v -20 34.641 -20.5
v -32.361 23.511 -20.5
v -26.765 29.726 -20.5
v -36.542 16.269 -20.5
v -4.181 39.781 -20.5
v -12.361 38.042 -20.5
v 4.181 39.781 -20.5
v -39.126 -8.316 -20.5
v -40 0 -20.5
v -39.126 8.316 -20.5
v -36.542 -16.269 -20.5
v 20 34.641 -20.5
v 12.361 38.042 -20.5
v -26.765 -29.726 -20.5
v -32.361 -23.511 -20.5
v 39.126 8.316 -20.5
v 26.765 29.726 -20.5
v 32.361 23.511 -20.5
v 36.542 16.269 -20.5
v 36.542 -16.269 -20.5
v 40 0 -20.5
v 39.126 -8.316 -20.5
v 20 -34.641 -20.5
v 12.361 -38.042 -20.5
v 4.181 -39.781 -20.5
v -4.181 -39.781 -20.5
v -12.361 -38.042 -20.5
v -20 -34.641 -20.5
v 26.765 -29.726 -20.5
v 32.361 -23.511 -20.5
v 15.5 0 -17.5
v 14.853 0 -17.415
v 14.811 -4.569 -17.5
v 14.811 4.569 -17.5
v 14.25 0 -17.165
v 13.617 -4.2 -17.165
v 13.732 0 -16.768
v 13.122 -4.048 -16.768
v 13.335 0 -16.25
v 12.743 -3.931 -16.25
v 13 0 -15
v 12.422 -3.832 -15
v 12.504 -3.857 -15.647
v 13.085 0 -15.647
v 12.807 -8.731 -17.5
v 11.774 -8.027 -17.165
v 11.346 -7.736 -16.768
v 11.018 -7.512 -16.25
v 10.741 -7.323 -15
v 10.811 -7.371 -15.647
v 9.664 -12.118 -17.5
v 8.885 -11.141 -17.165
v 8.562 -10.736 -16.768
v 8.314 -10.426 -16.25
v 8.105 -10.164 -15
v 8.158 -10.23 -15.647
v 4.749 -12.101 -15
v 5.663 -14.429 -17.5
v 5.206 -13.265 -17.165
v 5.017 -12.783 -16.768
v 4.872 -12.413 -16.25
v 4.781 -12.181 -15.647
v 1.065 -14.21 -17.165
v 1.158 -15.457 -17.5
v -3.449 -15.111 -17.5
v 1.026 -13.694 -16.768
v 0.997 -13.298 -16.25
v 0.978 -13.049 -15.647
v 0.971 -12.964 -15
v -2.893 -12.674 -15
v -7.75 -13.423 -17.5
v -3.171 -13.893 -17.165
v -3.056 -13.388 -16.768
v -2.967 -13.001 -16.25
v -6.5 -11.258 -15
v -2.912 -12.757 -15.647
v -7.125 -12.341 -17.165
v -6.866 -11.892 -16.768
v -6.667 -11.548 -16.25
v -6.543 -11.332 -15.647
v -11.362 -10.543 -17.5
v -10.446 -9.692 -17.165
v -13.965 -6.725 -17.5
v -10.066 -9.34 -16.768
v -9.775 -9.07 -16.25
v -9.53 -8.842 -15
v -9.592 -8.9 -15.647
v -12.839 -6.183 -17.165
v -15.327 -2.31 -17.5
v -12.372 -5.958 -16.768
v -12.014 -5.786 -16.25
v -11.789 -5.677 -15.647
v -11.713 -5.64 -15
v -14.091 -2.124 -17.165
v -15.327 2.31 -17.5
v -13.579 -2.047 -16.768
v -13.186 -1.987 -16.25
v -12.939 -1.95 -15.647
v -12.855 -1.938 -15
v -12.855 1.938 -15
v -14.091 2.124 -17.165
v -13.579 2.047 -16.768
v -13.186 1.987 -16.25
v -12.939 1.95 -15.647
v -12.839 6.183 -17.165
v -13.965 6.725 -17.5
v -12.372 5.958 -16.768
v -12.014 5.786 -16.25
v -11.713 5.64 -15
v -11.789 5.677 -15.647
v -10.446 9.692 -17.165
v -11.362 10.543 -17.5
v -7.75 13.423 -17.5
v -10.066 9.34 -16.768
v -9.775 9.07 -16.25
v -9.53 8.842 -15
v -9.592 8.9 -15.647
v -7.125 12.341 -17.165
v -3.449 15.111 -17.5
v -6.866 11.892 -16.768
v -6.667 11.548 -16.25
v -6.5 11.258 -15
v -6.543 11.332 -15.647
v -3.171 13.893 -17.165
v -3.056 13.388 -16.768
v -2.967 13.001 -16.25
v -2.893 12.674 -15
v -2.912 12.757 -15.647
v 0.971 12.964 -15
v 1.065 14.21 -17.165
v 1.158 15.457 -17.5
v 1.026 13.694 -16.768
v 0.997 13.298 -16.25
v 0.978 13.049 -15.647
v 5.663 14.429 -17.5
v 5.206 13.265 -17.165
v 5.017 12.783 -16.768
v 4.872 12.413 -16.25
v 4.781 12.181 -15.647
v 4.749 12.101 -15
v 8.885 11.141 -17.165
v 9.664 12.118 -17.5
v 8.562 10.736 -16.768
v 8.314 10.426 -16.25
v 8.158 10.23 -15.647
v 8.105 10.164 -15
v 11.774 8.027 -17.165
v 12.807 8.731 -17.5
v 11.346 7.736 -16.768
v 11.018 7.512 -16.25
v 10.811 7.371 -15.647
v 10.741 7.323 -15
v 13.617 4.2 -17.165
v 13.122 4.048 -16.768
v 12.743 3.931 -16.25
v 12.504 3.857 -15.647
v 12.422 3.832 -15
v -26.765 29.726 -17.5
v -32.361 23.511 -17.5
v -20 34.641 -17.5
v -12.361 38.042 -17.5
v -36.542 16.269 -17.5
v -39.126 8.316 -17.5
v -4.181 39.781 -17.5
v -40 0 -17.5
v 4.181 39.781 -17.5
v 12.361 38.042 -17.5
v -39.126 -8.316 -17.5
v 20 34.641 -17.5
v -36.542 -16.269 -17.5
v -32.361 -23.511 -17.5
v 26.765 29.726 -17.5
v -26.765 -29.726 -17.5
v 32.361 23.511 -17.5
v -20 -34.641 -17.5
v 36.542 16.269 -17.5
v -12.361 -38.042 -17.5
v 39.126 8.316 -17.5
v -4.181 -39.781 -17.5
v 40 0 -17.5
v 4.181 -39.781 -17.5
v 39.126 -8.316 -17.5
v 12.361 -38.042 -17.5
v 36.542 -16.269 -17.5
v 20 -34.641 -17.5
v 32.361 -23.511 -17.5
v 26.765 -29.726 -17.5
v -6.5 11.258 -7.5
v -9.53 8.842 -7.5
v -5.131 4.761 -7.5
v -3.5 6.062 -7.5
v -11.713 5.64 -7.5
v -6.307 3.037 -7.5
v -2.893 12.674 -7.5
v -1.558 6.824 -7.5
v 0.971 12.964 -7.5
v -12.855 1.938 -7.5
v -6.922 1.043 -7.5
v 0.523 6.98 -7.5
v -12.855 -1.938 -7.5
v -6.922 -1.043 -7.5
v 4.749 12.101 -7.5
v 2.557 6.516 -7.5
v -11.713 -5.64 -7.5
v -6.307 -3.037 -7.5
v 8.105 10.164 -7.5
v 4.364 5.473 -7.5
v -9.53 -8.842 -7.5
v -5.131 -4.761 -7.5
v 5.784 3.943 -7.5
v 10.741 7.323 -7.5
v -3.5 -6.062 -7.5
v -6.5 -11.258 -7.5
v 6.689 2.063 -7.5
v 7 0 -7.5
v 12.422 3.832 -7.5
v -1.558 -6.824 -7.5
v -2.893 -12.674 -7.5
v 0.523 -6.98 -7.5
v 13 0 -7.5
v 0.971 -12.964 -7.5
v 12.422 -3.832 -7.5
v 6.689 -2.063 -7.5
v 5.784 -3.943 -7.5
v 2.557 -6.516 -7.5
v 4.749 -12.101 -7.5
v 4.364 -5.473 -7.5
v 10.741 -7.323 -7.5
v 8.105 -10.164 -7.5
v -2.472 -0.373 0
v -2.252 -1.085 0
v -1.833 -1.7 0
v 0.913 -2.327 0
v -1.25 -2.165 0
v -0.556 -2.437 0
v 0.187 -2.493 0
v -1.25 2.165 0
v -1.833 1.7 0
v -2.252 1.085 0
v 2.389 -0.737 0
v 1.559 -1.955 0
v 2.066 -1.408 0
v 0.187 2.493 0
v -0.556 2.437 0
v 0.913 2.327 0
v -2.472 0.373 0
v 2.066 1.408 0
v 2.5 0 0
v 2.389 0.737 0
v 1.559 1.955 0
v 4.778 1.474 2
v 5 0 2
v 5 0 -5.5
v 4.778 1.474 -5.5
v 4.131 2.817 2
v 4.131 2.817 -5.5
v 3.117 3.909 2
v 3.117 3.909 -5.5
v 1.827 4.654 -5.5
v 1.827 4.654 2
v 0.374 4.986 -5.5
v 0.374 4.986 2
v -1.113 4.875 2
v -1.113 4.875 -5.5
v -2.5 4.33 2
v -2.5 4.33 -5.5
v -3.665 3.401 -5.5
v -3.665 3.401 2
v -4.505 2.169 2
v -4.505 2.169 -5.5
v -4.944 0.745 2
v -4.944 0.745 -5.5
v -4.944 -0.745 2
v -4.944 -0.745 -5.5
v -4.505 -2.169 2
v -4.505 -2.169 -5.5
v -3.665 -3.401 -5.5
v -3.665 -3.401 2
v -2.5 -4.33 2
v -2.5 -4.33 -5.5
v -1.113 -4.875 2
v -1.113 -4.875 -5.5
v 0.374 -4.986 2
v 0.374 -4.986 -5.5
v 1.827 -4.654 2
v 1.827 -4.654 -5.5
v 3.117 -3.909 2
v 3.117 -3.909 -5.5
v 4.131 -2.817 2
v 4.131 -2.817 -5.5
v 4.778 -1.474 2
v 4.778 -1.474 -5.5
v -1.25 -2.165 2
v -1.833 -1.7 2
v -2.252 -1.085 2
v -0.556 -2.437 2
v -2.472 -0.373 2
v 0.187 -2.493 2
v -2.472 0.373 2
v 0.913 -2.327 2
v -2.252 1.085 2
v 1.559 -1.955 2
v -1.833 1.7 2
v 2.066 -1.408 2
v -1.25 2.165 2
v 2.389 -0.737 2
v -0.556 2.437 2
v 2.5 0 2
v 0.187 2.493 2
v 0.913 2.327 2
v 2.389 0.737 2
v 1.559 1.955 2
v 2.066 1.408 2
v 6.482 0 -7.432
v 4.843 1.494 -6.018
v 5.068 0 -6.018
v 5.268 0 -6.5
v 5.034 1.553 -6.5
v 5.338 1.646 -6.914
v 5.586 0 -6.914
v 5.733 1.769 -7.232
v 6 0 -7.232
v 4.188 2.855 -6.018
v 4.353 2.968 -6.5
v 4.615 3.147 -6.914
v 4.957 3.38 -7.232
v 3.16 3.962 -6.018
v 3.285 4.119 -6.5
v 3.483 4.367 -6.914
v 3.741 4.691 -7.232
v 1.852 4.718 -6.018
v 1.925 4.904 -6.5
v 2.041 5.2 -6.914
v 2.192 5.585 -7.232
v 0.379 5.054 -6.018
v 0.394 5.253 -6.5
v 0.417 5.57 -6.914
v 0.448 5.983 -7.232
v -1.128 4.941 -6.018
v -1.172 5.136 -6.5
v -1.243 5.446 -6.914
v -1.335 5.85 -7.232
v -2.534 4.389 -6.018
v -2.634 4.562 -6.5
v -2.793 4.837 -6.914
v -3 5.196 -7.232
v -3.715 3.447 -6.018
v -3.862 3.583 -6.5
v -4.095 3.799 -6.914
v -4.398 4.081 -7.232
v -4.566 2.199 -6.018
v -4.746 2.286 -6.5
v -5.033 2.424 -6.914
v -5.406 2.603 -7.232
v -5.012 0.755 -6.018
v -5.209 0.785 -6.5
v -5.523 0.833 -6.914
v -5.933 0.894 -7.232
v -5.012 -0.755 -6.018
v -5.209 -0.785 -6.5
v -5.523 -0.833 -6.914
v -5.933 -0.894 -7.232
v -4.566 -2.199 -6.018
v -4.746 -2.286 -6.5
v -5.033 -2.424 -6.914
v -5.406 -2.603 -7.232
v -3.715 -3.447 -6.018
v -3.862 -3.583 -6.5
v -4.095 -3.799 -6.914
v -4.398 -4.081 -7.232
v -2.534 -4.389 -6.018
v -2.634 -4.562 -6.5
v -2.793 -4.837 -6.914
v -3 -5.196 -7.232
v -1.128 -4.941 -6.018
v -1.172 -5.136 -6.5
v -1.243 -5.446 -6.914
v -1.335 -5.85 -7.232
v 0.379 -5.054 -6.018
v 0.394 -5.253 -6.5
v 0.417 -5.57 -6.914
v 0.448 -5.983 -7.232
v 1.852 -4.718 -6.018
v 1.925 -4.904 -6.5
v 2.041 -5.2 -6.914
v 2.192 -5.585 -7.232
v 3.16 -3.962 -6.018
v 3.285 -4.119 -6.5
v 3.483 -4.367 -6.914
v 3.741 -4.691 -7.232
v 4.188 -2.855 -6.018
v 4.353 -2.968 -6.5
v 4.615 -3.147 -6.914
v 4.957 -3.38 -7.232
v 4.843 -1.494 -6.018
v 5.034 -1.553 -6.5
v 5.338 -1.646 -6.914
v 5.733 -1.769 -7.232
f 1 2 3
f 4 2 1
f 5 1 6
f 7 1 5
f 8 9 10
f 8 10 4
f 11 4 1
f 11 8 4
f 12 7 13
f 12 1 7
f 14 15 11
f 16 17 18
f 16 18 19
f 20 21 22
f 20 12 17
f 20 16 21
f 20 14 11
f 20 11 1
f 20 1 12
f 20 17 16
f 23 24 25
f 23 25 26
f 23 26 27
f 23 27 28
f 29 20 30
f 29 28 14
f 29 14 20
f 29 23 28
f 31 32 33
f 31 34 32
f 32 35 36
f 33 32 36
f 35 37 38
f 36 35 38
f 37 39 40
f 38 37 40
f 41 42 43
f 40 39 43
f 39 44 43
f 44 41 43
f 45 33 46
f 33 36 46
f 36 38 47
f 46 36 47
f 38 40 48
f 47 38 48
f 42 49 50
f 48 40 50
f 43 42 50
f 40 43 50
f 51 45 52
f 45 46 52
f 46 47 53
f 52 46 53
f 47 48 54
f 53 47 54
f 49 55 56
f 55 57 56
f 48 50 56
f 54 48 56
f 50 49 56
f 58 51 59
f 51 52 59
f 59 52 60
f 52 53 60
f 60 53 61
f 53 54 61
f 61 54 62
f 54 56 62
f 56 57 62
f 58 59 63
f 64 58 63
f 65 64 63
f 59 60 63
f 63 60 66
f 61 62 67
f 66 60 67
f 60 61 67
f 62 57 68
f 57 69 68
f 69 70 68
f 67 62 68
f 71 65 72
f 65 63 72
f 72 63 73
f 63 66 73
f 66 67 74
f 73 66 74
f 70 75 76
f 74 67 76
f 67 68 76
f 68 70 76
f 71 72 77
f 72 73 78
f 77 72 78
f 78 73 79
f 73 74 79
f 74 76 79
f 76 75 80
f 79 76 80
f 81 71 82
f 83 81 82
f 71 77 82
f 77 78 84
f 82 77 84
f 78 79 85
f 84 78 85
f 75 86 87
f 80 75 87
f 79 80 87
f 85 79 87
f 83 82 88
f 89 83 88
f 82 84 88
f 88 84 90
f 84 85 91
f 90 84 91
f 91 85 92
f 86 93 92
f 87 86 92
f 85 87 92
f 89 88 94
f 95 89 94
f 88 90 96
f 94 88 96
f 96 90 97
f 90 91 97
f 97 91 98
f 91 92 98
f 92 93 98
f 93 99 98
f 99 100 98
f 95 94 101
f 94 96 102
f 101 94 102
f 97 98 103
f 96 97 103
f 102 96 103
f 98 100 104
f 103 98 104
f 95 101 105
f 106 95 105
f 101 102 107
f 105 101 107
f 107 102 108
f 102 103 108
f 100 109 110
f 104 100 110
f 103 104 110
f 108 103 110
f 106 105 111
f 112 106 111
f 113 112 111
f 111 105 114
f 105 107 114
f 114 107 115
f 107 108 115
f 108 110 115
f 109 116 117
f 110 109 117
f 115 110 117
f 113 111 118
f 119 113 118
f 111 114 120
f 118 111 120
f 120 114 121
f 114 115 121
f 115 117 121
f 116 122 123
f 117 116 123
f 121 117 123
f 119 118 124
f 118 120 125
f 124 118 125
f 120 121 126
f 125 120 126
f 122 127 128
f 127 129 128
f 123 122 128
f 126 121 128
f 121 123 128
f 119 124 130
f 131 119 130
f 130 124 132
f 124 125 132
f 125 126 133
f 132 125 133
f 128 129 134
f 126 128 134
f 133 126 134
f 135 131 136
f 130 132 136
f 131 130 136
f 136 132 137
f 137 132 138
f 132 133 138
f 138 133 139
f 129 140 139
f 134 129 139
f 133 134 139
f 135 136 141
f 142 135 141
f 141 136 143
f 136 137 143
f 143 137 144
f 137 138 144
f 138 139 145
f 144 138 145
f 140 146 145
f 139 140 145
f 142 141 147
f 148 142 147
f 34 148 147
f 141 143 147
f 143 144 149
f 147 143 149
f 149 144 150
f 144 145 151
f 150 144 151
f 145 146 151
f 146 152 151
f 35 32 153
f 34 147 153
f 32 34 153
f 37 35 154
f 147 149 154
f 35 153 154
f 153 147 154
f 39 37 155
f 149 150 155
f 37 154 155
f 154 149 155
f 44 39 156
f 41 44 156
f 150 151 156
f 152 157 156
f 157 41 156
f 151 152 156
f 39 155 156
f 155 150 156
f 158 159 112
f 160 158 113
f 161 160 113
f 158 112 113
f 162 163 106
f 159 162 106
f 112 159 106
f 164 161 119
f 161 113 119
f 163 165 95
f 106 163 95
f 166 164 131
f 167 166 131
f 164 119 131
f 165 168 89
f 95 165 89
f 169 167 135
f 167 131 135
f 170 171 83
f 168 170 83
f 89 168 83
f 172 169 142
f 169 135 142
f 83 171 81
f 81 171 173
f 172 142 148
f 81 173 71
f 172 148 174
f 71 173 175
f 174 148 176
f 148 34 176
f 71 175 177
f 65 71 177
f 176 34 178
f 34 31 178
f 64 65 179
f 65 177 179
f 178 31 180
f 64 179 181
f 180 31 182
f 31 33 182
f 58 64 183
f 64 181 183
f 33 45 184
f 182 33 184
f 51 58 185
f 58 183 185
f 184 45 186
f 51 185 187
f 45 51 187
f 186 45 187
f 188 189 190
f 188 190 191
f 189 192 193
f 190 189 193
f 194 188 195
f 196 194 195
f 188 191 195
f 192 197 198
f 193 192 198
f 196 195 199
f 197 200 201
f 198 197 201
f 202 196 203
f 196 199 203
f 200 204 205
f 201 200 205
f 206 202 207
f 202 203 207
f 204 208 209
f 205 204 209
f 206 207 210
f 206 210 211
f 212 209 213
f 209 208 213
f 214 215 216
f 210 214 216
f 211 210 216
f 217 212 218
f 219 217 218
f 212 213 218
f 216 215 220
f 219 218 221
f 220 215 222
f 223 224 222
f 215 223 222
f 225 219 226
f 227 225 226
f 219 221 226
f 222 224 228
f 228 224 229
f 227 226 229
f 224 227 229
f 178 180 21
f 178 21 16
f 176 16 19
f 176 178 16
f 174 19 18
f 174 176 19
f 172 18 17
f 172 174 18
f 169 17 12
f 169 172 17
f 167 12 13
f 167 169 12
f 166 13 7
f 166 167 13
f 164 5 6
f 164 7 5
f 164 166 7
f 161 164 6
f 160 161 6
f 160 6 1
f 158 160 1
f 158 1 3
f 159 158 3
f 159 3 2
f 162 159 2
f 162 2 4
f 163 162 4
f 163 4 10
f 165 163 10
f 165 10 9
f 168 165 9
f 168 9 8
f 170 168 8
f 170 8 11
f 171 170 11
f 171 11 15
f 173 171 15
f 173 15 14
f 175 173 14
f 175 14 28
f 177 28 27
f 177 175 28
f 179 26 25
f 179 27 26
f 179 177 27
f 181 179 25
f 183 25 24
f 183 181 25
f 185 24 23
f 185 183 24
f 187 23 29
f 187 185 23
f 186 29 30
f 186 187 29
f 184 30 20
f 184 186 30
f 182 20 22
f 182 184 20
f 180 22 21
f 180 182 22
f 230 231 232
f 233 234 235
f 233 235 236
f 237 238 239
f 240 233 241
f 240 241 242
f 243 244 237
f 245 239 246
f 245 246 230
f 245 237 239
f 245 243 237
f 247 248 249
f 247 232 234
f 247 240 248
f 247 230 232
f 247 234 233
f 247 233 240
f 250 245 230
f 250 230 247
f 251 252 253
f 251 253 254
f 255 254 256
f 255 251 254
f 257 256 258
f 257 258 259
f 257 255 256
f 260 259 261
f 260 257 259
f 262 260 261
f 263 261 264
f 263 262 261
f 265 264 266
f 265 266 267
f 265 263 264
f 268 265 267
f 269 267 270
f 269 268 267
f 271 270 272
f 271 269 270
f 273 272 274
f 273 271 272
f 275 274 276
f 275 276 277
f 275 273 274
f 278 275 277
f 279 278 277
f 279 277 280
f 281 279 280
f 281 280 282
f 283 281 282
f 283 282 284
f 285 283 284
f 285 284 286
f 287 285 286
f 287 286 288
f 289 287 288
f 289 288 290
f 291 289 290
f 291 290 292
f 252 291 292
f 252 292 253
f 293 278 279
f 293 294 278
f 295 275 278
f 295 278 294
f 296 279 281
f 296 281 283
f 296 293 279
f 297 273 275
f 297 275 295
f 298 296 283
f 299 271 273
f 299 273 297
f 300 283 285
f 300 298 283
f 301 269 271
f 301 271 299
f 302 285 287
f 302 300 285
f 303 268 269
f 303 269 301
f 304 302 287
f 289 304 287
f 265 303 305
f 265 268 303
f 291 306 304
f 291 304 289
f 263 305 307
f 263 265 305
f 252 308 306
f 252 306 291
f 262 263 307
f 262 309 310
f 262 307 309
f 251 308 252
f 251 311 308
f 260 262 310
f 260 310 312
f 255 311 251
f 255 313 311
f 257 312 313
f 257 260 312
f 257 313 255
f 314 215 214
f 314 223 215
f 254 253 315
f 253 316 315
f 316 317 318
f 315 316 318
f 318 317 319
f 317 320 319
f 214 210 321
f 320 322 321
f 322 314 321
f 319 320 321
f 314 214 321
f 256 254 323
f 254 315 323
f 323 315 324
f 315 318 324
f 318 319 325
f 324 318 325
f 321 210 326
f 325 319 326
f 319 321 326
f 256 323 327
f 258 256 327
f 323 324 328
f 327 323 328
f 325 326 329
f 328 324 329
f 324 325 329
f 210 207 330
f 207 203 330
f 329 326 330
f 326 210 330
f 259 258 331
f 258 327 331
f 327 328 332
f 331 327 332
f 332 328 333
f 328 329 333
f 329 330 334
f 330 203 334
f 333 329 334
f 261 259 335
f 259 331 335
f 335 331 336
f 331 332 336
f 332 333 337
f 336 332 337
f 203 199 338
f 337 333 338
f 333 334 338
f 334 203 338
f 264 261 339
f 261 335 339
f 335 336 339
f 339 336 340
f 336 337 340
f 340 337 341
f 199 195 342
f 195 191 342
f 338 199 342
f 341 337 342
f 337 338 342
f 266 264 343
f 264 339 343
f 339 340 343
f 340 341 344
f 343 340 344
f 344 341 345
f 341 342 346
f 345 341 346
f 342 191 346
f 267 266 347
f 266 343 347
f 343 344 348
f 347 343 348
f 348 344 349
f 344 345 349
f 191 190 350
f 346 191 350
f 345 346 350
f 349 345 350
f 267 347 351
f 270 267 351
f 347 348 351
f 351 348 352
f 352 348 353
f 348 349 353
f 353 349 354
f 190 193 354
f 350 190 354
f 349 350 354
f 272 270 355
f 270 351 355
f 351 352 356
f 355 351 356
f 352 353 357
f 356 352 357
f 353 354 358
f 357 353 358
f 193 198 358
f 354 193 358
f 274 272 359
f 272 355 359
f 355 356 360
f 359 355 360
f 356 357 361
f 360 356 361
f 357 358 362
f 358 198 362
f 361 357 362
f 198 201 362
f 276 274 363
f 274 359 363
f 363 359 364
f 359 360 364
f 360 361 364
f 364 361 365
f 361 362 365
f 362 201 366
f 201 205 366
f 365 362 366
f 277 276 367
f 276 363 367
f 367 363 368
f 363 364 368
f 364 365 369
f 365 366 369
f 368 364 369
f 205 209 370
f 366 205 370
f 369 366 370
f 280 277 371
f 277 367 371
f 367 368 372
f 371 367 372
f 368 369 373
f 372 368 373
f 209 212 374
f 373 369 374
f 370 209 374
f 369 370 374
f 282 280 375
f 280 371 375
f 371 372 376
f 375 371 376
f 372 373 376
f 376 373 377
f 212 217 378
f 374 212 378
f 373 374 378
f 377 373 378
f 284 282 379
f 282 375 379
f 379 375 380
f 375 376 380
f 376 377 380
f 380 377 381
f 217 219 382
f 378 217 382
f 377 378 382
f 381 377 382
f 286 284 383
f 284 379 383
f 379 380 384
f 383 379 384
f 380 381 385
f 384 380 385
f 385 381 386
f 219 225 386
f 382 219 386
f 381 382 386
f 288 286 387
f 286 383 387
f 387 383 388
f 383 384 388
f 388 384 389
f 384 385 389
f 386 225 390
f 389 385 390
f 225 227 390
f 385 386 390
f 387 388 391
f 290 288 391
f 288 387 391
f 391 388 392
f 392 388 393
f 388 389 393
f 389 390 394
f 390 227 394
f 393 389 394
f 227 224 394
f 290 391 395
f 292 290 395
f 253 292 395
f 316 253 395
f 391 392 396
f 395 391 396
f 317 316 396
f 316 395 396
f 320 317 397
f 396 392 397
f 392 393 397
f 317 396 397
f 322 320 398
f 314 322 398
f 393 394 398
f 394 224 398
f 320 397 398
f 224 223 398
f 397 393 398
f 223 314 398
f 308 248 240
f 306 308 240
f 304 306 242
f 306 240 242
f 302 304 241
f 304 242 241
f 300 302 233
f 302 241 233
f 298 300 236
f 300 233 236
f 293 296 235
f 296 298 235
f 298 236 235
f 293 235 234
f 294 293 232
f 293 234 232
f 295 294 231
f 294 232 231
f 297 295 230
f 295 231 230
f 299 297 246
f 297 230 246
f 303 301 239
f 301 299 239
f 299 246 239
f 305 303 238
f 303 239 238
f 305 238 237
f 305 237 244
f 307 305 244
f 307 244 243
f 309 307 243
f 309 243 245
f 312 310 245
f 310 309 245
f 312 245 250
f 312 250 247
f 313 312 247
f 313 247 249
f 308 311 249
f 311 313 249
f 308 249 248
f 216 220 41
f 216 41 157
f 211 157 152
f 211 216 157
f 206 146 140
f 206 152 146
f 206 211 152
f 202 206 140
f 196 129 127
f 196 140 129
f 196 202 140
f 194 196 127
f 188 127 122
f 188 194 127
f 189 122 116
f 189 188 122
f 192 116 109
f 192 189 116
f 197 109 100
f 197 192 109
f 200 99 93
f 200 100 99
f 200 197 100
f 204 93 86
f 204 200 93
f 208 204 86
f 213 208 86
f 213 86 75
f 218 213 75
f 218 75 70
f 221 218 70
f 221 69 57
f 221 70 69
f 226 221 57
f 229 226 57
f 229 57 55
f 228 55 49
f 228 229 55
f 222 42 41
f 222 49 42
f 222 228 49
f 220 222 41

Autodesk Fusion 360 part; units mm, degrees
sketch "Sketch1" plane through (0, 0, 0) normal (0, 0, 1) x (1, 0, 0)
  circle A0 centre (0, 0) radius 2.5
  circle A1 centre (0, 0) radius 5
  dimension "d1" = 5
  dimension "d2" = 10
extrude "Extrude1" add sketch "Sketch1" along normal blind 2
extrude "Extrude2" add sketch "Sketch1" against normal blind 5.5 contours A0 | A1
sketch "Sketch2" plane through (0, 0, -5.5) normal (0, 0, -1) x (1, 0, 0)
  circle A0 centre (0, 0) radius 5
  circle A1 centre (0, 0) radius 13
  dimension "d7" = 26
extrude "Extrude3" add sketch "Sketch2" along normal blind 5 contours A0 | A1
extrude "Extrude4" cut 1 faces at (10.2663, 0.8943, -5.5) along direction (0, 0, -1) blind 2
fillet "Fillet1" radius 2 1 edges at (-4.6616, -1.8081, -7.5)
extrude "Extrude5" add 1 faces at (2.1667, -3.7528, -10.5) along direction (0, 0, -1) blind 5.5
extrude "Extrude6" add 1 faces at (2.1667, -3.7528, -16) along direction (0, 0, -1) blind 1.5
sketch "Sketch3" plane through (0, 0, -17.5) normal (0, 0, -1) x (1, 0, 0)
  circle A0 centre (0, 0) radius 13
  circle A1 centre (0, 0) radius 40
  dimension "d18" = 80
extrude "Extrude7" add sketch "Sketch3" along normal blind 3 contours A0 | A1
fillet "Fillet2" radius 2.5 1 edges at (-12.1203, 4.701, -17.5)
